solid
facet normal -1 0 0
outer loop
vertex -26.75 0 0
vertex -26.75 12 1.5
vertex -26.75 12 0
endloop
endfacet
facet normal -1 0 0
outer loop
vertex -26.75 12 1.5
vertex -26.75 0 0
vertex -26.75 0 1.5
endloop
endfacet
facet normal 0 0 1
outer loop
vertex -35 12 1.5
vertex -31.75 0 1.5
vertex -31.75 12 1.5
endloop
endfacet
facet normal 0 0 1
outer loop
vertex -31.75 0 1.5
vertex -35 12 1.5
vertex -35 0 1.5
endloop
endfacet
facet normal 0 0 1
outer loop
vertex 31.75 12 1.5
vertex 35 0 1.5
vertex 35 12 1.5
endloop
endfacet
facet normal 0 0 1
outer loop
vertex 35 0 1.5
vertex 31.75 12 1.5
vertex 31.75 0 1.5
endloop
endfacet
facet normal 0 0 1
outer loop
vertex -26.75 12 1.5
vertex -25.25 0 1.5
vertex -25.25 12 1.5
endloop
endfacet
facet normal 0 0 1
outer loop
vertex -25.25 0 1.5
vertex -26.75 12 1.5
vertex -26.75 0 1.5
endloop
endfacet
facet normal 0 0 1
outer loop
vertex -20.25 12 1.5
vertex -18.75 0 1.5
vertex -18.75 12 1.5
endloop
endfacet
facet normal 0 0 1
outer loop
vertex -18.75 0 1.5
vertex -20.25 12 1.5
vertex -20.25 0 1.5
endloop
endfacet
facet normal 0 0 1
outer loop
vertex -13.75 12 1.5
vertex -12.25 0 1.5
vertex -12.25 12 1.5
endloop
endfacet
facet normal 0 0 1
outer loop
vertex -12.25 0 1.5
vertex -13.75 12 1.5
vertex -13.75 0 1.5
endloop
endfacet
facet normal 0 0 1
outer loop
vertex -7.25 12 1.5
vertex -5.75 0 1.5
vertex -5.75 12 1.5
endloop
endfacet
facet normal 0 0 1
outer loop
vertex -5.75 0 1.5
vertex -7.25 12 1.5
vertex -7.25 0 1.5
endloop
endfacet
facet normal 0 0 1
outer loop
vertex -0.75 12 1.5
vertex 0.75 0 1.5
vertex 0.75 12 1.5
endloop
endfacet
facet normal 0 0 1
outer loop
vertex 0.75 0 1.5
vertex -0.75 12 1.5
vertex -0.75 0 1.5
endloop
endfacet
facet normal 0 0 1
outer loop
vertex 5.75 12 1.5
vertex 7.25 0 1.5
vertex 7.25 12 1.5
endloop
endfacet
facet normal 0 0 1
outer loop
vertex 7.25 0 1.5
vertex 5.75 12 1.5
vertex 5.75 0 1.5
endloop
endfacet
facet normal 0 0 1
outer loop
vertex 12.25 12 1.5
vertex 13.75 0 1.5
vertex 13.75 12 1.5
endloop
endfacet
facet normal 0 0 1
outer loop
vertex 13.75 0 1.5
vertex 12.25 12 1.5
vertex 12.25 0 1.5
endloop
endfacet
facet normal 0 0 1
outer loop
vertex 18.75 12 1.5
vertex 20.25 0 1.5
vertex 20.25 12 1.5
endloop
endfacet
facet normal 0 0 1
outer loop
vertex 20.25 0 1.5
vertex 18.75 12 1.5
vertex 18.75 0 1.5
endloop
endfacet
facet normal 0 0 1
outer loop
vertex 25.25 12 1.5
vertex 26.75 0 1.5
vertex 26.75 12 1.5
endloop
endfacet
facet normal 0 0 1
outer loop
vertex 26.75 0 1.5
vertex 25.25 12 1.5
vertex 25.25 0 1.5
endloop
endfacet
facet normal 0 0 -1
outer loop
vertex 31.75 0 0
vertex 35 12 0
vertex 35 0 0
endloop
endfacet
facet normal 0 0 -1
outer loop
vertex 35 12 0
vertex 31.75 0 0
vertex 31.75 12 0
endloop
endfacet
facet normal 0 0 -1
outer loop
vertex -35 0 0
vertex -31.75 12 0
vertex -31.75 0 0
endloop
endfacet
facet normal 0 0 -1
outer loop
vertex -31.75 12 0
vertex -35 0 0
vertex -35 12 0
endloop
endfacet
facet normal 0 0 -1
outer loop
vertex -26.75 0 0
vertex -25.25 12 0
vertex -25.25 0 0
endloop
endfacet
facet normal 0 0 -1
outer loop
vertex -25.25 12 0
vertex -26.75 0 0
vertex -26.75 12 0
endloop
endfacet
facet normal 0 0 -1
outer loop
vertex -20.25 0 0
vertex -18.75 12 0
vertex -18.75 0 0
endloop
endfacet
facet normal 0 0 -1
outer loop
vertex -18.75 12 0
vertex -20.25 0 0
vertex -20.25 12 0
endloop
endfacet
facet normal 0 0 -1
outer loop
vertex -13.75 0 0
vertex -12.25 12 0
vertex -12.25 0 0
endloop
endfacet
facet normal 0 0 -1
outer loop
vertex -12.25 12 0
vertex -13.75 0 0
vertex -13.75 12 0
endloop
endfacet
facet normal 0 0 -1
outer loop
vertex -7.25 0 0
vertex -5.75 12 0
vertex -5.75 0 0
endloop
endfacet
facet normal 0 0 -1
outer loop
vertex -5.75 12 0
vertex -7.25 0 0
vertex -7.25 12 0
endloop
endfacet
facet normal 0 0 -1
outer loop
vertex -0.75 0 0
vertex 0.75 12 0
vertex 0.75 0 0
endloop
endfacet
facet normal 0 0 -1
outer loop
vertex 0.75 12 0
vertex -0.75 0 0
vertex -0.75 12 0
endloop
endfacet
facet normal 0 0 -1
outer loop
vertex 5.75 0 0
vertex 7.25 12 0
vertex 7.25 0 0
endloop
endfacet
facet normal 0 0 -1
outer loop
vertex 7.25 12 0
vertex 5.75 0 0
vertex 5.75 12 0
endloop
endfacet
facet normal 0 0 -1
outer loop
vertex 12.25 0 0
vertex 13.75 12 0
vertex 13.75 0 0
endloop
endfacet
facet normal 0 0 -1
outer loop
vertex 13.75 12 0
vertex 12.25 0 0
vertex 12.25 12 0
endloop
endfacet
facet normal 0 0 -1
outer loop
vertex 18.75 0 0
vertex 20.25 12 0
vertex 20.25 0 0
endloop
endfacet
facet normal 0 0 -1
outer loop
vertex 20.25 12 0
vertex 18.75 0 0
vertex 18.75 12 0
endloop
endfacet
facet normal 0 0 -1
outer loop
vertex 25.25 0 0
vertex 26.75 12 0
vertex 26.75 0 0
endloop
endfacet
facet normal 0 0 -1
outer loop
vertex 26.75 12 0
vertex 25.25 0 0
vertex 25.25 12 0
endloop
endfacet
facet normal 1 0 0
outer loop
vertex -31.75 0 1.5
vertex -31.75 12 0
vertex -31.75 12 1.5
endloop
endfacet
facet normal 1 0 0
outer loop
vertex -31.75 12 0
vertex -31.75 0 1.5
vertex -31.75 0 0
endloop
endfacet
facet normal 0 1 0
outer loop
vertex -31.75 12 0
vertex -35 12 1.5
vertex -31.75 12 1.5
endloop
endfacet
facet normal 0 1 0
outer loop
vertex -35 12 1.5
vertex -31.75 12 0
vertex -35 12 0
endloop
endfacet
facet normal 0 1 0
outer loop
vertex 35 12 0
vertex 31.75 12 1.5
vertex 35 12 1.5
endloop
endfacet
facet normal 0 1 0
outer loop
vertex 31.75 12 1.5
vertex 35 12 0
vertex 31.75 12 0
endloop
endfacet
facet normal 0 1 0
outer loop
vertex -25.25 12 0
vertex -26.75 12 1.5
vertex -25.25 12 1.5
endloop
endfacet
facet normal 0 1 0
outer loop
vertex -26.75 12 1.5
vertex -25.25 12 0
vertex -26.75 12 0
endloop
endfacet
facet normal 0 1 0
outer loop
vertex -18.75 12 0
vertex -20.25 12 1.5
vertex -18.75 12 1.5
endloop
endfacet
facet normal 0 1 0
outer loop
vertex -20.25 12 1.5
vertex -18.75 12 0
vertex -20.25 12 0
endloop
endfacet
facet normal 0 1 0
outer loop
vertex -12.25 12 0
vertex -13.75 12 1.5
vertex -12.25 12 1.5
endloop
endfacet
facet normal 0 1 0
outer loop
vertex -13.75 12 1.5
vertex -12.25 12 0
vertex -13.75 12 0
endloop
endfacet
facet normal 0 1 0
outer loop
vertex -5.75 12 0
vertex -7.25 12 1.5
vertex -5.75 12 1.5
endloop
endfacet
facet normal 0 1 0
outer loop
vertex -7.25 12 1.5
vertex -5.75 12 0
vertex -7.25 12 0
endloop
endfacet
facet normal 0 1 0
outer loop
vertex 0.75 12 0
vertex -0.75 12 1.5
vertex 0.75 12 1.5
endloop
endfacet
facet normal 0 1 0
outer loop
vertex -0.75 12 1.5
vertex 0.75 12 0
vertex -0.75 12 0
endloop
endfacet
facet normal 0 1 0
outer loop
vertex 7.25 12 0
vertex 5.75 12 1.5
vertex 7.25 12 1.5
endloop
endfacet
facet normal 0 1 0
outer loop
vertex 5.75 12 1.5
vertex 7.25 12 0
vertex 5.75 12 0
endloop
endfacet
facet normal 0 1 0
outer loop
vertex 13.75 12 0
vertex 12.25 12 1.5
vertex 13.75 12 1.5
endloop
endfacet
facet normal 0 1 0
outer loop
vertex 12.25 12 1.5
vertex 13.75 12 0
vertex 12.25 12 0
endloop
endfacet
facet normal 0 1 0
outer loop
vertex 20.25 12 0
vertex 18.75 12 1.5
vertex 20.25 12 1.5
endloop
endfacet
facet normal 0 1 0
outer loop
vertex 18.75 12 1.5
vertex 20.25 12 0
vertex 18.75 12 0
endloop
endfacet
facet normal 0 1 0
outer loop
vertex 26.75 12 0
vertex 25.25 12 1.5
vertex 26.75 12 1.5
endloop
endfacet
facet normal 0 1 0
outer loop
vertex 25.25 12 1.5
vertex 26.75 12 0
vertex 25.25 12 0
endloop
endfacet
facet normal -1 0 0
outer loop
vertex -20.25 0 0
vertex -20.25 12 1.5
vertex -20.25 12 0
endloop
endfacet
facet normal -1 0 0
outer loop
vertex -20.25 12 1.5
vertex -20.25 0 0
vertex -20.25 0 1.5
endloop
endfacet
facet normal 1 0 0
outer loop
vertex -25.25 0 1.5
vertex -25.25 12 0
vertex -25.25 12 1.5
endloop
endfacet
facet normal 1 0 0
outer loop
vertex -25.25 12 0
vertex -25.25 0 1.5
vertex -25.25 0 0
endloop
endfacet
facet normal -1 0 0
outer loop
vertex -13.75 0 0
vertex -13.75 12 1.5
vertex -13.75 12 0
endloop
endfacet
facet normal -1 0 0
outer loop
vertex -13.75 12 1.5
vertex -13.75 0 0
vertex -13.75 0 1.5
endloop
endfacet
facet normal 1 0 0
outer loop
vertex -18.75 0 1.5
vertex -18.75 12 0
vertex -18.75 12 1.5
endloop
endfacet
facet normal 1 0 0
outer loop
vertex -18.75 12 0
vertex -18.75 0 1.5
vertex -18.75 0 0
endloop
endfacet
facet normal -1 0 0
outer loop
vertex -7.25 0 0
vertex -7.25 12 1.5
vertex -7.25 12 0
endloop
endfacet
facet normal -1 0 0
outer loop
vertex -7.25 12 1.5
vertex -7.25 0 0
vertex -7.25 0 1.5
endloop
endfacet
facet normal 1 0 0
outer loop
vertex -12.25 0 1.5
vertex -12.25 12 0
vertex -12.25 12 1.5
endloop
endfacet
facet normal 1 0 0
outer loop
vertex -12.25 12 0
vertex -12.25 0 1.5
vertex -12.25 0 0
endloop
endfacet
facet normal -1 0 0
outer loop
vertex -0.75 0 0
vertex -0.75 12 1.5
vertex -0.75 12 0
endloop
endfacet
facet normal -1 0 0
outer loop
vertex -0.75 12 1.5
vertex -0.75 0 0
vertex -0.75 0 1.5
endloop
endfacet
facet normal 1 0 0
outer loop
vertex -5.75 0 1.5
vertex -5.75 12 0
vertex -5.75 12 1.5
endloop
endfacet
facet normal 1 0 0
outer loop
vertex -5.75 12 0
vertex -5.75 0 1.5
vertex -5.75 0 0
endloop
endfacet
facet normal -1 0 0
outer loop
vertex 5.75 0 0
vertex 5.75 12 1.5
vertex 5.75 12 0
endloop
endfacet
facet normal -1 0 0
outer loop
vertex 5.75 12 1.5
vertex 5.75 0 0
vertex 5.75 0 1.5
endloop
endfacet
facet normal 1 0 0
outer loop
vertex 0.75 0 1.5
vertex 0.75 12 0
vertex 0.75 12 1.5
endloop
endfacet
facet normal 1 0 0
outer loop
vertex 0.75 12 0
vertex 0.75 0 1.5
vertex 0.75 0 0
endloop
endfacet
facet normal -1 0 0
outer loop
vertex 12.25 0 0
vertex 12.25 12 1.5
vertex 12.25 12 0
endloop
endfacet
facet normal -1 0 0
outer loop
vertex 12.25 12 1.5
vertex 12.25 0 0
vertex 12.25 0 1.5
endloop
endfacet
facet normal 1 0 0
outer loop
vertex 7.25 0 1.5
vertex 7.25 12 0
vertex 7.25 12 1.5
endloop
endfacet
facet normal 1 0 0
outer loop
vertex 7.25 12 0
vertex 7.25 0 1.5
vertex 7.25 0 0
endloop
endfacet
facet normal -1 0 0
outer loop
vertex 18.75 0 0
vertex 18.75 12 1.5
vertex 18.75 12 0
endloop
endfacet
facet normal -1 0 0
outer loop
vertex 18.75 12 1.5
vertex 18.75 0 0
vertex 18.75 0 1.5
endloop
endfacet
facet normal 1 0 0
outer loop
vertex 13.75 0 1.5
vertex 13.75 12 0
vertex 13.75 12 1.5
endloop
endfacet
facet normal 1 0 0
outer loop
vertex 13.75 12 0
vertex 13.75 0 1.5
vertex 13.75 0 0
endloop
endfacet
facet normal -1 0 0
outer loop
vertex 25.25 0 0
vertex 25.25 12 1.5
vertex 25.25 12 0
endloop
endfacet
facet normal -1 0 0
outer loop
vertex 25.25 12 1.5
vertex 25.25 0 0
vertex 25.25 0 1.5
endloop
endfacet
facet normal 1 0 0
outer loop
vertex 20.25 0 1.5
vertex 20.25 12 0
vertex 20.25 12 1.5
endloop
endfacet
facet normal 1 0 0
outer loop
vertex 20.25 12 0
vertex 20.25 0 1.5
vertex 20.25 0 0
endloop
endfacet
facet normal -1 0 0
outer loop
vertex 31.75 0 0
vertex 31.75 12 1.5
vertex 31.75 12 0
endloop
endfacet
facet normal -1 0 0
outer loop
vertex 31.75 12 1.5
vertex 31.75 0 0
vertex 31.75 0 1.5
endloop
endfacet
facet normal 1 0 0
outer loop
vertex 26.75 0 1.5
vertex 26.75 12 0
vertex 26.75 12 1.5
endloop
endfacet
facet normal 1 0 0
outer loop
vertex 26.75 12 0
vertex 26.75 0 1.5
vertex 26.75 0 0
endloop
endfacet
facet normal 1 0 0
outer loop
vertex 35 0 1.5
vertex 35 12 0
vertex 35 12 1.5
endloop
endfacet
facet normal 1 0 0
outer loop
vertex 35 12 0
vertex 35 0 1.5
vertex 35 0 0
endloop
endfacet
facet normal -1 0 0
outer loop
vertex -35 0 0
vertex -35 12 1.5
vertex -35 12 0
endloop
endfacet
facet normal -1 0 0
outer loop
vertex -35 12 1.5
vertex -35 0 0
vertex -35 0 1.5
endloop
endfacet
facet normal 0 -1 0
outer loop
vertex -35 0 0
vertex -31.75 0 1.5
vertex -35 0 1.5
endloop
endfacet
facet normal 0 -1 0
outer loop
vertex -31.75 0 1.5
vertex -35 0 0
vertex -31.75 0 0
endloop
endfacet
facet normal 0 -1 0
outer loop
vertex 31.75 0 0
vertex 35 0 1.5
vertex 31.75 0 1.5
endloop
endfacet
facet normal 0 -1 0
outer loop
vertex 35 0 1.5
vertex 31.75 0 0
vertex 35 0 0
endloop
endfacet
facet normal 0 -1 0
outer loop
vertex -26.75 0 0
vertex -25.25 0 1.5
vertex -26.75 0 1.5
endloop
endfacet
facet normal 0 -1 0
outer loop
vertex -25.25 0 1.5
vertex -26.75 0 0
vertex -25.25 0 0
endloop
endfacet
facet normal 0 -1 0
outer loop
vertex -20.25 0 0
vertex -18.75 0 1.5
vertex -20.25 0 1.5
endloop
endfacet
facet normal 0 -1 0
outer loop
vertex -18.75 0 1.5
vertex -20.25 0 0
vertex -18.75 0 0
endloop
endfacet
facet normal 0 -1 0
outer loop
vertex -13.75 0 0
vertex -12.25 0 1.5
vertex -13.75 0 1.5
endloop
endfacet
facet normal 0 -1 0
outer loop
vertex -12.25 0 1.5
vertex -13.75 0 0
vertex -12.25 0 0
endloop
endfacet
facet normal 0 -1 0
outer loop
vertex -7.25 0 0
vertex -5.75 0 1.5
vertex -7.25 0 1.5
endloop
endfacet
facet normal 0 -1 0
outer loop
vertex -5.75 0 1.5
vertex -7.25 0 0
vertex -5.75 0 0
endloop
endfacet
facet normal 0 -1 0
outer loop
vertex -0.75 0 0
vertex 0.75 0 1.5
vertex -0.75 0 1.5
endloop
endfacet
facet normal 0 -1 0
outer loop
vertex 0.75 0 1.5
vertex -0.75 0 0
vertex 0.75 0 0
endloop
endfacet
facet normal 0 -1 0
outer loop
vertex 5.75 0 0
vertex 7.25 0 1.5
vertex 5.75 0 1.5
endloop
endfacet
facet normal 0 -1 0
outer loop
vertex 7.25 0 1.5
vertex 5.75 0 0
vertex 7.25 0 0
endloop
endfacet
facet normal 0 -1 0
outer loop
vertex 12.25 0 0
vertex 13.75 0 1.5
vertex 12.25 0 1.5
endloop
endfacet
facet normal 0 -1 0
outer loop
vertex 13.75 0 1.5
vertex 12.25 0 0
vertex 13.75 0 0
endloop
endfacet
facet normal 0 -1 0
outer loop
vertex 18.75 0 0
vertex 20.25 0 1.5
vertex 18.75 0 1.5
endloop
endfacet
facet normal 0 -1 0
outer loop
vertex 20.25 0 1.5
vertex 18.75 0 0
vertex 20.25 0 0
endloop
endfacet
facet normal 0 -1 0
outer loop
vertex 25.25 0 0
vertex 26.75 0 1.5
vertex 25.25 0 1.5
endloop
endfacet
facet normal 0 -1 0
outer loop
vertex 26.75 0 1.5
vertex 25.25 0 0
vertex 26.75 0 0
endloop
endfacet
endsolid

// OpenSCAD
// 10-well agarose gel comb - printed lying flat
// Units: mm

// ---- Parameters ----
plate_t     = 1.5;   // plate thickness (Z)
spine_l     = 70;    // spine length (X)
spine_w     = 12;    // spine width (Y)
tooth_n     = 10;    // number of teeth
tooth_w     = 5.0;   // tooth width (X)
tooth_l     = 12;    // tooth length (Y)
gap         = 1.5;   // gap between teeth (X)
eps         = 0.5;   // cutter overshoot past faces (Z)

$fn = 64;

// ---- Derived ----
pitch   = tooth_w + gap;          // centre-to-centre spacing
x0      = -(tooth_n - 1) * pitch / 2; // first tooth centre (row centred)

// ---- Model ----
difference() {
    union() {
        // Spine (back bar)
        translate([-spine_l / 2, 0, 0])
            cube([spine_l, spine_w, plate_t]);

        // Teeth
        for (i = [0 : tooth_n - 1])
            translate([x0 + i * pitch - tooth_w / 2,
                       -tooth_l,
                       0])
                cube([tooth_w, tooth_l + spine_w, plate_t]);
    }

    // Pockets for the wells (cut through the plate)
    for (i = [0 : tooth_n - 1])
        translate([x0 + i * pitch - tooth_w / 2,
                   -tooth_l - eps,
                   -eps])
            cube([tooth_w, tooth_l + spine_w + 2 * eps,
                  plate_t + 2 * eps]);
}
